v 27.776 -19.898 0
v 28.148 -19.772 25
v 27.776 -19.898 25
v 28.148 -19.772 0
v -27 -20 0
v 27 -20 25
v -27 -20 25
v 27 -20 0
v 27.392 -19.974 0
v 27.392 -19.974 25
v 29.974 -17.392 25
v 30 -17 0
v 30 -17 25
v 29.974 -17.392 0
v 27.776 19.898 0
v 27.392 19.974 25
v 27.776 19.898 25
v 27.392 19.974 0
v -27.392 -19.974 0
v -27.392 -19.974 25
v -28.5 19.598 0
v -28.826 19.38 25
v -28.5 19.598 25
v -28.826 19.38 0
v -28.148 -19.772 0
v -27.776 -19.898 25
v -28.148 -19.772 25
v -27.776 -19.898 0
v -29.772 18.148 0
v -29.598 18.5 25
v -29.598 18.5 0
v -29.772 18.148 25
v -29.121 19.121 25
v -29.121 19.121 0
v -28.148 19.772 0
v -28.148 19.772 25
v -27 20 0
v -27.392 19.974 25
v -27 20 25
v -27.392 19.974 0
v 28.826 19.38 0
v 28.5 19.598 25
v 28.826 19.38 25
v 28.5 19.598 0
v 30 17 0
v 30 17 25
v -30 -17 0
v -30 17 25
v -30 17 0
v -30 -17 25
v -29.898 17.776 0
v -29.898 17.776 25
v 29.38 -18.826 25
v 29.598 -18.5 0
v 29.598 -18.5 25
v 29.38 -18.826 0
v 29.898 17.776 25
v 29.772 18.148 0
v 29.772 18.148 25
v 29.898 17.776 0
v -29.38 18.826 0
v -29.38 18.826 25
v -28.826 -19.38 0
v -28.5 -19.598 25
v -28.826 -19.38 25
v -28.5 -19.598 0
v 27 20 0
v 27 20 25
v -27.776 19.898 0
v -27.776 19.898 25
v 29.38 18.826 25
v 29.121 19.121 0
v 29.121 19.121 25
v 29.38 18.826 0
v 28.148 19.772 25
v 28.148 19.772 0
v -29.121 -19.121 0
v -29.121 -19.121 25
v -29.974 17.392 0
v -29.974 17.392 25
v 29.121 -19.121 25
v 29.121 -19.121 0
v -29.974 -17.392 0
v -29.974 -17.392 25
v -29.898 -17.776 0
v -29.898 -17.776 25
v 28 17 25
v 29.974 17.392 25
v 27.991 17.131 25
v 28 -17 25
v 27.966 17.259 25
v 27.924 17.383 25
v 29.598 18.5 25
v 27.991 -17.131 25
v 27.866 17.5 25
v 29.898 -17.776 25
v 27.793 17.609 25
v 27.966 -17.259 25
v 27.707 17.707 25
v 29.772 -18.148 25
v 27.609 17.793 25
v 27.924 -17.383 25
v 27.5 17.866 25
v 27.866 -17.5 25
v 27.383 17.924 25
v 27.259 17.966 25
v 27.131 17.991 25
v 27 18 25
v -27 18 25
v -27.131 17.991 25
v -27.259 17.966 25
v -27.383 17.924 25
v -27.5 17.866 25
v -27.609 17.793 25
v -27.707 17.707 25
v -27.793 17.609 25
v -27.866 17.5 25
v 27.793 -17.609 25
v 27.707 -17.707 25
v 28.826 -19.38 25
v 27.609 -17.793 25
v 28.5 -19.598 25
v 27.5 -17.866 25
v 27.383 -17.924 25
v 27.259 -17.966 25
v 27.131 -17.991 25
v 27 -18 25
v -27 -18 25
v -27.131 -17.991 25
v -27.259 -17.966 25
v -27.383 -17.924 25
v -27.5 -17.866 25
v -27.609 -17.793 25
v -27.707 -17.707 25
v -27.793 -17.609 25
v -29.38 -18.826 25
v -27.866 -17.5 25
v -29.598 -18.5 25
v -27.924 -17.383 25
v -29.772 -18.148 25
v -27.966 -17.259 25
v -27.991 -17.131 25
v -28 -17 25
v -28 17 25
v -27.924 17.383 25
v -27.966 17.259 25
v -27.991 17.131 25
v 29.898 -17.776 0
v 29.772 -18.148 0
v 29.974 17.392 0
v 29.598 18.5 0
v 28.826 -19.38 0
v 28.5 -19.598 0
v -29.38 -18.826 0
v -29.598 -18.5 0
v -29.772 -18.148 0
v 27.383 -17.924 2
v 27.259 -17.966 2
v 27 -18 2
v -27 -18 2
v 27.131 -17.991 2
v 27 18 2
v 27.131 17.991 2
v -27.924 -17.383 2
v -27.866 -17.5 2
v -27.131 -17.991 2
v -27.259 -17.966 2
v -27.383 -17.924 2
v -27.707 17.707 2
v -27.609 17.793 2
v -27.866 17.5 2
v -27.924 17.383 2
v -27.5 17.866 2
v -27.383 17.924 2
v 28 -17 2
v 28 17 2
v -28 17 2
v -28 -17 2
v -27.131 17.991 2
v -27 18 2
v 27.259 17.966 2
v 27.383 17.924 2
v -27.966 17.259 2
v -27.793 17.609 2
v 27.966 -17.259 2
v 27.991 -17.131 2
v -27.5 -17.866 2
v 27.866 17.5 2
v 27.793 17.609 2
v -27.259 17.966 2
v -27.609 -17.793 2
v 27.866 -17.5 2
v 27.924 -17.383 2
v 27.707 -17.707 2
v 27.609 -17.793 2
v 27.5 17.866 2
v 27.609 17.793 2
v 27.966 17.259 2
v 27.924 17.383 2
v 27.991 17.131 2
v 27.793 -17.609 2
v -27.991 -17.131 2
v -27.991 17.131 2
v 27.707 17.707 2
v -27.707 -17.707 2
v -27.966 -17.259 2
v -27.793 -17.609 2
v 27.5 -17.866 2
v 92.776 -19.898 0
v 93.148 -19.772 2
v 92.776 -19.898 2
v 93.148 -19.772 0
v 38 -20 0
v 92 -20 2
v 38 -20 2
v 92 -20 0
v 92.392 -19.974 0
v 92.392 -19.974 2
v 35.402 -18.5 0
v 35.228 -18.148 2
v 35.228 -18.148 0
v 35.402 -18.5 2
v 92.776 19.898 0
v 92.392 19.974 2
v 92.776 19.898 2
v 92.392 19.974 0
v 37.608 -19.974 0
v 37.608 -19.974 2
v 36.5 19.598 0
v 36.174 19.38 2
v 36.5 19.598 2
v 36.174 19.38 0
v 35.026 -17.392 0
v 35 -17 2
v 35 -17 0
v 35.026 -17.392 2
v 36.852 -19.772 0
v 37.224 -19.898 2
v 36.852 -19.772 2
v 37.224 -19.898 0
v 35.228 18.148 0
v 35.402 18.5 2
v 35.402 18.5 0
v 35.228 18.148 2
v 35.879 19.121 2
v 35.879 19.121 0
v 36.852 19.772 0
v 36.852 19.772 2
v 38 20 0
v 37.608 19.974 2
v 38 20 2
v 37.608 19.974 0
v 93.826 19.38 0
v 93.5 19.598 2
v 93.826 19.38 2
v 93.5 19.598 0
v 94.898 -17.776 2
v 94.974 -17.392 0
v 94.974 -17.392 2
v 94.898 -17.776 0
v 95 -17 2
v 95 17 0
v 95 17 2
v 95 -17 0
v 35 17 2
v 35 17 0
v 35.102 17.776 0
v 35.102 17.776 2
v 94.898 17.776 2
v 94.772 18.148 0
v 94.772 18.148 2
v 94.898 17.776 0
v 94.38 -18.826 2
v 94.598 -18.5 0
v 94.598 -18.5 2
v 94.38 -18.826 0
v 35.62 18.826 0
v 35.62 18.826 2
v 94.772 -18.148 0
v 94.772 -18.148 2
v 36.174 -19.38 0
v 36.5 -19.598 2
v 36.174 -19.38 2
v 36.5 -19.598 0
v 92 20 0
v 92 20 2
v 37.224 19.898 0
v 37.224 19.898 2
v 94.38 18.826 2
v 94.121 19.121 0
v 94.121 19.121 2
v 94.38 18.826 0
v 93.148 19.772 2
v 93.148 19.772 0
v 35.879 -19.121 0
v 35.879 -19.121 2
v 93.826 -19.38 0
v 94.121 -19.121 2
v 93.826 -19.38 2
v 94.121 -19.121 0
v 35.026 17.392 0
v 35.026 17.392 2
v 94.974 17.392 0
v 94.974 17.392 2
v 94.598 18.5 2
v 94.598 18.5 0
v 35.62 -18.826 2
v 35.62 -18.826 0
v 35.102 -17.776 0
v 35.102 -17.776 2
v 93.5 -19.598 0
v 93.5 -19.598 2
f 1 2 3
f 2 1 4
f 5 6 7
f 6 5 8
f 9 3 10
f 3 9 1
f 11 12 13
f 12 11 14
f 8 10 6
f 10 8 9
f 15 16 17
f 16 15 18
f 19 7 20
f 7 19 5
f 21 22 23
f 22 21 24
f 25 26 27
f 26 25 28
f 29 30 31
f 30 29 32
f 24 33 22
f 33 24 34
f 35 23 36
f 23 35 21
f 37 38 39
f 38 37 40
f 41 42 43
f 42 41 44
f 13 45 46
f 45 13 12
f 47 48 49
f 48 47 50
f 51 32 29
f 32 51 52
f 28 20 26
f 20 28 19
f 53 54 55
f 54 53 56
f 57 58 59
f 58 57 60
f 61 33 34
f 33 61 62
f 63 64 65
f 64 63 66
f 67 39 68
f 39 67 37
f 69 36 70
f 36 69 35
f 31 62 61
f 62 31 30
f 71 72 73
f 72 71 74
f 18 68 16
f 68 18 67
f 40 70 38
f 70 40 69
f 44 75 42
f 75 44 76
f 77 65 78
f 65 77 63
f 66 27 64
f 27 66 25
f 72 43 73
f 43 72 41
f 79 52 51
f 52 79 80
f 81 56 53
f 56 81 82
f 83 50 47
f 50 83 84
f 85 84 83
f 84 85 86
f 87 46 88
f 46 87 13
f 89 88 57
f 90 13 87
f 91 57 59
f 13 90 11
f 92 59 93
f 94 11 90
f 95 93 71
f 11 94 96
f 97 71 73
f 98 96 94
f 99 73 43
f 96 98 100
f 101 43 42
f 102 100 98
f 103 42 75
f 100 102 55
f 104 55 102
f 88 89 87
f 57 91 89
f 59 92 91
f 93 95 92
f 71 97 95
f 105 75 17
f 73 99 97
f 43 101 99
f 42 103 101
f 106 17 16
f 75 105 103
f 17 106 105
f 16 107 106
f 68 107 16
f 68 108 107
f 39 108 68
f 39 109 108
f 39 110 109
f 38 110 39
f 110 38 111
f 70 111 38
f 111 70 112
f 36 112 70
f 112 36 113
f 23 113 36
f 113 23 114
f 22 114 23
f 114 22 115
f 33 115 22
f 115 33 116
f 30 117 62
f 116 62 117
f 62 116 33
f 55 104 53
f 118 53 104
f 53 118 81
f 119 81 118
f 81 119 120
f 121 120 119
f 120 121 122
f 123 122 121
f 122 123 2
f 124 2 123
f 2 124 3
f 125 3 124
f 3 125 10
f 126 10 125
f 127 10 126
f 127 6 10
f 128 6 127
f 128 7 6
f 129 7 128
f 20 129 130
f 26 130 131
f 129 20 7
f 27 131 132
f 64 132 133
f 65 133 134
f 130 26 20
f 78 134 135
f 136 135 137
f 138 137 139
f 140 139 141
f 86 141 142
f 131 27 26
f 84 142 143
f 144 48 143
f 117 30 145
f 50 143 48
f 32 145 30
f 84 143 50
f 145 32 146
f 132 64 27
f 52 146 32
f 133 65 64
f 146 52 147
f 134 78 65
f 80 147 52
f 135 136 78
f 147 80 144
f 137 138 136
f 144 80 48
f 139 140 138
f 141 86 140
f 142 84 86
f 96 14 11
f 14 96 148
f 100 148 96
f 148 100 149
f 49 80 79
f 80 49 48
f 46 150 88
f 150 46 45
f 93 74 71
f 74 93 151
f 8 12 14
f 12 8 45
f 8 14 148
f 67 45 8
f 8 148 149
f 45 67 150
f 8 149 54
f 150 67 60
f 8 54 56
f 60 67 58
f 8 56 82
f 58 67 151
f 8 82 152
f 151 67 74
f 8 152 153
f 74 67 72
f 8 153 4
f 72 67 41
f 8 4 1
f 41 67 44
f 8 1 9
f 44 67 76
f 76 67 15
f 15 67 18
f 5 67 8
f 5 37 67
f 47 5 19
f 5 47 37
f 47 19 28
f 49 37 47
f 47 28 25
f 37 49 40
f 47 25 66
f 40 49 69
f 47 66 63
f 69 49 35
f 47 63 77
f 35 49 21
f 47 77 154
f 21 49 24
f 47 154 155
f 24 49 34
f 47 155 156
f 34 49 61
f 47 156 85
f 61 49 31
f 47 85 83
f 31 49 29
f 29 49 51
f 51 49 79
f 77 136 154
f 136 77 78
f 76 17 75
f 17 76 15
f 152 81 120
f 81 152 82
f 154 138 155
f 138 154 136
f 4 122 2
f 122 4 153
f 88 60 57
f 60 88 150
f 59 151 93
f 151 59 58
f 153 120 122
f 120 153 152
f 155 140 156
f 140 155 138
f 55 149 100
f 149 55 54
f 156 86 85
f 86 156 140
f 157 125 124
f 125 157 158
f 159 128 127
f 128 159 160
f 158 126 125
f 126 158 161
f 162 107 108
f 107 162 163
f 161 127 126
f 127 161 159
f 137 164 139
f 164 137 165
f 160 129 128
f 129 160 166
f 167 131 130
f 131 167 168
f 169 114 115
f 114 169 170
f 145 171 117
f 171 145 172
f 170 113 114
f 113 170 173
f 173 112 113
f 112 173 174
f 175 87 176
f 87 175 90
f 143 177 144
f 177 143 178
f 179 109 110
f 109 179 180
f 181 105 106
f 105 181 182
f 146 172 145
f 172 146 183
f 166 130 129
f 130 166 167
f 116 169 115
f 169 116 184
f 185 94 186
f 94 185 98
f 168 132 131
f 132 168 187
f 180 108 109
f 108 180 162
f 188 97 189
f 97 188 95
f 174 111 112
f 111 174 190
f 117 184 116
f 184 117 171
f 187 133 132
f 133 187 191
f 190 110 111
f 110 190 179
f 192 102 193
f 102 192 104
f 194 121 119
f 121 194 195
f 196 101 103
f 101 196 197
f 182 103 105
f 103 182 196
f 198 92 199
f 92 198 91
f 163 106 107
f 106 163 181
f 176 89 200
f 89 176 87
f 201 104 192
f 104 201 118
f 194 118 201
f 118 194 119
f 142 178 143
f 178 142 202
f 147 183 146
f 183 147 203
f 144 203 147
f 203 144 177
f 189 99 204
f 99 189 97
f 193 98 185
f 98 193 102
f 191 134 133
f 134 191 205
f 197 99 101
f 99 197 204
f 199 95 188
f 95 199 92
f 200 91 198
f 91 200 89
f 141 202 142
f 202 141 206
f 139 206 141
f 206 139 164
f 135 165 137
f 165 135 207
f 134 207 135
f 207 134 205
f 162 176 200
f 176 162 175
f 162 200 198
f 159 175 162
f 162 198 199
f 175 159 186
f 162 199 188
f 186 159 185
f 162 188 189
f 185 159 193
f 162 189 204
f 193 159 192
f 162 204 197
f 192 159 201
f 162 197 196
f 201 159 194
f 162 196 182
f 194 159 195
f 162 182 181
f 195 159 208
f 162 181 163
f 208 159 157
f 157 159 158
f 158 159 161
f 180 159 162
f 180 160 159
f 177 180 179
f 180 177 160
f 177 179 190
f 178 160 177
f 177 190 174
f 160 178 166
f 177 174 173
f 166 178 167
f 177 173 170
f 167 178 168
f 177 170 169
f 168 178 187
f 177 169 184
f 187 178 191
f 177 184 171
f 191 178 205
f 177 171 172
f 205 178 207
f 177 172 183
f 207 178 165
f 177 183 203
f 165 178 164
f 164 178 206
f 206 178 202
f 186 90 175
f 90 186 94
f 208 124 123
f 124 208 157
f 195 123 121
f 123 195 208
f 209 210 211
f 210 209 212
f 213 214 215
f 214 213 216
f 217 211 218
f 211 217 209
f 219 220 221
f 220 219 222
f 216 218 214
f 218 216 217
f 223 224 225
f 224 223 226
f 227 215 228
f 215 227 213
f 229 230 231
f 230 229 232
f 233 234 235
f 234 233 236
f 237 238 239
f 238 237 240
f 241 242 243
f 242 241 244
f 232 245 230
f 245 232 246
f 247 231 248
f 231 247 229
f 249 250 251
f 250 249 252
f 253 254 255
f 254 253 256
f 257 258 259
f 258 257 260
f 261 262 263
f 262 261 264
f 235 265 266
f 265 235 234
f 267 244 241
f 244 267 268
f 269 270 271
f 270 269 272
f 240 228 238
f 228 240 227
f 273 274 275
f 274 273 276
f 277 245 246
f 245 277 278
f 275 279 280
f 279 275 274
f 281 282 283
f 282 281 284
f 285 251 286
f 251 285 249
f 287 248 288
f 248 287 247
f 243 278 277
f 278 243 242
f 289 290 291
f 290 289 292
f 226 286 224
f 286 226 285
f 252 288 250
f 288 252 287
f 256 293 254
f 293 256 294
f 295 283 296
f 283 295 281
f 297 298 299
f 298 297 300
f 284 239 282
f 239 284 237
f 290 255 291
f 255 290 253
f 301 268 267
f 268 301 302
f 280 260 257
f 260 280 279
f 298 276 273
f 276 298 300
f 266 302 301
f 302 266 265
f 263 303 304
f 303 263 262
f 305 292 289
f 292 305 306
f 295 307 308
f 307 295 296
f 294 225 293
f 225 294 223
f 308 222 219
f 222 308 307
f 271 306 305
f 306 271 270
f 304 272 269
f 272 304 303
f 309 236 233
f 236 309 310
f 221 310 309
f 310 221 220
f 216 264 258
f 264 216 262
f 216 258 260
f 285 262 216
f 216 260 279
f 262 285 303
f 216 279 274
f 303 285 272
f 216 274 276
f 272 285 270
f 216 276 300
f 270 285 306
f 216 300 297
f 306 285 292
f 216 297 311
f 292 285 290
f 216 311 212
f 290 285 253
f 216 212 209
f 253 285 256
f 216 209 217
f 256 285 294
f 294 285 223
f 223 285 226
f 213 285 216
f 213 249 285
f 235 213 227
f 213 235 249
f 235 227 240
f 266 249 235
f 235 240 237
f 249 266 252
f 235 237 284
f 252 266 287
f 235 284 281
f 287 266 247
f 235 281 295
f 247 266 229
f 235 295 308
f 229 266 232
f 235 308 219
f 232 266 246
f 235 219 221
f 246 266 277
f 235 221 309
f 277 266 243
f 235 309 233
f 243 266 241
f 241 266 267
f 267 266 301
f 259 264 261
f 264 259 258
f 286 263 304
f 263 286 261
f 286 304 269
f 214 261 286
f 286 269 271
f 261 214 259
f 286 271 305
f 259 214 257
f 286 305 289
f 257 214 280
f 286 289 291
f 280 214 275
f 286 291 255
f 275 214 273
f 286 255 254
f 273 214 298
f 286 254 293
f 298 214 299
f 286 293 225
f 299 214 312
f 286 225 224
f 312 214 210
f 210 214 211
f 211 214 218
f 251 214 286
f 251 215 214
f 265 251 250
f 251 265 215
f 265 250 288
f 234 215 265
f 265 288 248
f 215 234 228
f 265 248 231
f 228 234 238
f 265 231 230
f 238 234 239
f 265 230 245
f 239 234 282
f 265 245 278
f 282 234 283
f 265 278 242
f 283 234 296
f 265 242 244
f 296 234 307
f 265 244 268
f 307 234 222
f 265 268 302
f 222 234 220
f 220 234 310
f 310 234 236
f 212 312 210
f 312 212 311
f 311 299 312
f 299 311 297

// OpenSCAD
// Parametric storage box
/* [Box] */
// Outer width in mm
width = 60; // [20:200]
// Outer depth in mm
depth = 40; // [20:200]
height = 25; // [10:100]
wall = 2; // [1:0.5:5]
/* [Lid] */
lid = true;
style = "rounded"; // [rounded, square:Square corners]
/* [Hidden] */
$fn = 48;
eps = 0.01;

function inner(v) = [for (x = v) x - 2 * wall];

module rounded_square(size, r) {
    offset(r = r) offset(delta = -r) square(size, center = true);
}

module shell(size) {
    difference() {
        linear_extrude(size.z) rounded_square([size.x, size.y], 3);
        translate([0, 0, wall]) linear_extrude(size.z) rounded_square(inner([size.x, size.y]), 1);
    }
}

shell([width, depth, height]);
if (lid)
    translate([width + 5, 0, 0])
        linear_extrude(wall) rounded_square([width, depth], 3);
